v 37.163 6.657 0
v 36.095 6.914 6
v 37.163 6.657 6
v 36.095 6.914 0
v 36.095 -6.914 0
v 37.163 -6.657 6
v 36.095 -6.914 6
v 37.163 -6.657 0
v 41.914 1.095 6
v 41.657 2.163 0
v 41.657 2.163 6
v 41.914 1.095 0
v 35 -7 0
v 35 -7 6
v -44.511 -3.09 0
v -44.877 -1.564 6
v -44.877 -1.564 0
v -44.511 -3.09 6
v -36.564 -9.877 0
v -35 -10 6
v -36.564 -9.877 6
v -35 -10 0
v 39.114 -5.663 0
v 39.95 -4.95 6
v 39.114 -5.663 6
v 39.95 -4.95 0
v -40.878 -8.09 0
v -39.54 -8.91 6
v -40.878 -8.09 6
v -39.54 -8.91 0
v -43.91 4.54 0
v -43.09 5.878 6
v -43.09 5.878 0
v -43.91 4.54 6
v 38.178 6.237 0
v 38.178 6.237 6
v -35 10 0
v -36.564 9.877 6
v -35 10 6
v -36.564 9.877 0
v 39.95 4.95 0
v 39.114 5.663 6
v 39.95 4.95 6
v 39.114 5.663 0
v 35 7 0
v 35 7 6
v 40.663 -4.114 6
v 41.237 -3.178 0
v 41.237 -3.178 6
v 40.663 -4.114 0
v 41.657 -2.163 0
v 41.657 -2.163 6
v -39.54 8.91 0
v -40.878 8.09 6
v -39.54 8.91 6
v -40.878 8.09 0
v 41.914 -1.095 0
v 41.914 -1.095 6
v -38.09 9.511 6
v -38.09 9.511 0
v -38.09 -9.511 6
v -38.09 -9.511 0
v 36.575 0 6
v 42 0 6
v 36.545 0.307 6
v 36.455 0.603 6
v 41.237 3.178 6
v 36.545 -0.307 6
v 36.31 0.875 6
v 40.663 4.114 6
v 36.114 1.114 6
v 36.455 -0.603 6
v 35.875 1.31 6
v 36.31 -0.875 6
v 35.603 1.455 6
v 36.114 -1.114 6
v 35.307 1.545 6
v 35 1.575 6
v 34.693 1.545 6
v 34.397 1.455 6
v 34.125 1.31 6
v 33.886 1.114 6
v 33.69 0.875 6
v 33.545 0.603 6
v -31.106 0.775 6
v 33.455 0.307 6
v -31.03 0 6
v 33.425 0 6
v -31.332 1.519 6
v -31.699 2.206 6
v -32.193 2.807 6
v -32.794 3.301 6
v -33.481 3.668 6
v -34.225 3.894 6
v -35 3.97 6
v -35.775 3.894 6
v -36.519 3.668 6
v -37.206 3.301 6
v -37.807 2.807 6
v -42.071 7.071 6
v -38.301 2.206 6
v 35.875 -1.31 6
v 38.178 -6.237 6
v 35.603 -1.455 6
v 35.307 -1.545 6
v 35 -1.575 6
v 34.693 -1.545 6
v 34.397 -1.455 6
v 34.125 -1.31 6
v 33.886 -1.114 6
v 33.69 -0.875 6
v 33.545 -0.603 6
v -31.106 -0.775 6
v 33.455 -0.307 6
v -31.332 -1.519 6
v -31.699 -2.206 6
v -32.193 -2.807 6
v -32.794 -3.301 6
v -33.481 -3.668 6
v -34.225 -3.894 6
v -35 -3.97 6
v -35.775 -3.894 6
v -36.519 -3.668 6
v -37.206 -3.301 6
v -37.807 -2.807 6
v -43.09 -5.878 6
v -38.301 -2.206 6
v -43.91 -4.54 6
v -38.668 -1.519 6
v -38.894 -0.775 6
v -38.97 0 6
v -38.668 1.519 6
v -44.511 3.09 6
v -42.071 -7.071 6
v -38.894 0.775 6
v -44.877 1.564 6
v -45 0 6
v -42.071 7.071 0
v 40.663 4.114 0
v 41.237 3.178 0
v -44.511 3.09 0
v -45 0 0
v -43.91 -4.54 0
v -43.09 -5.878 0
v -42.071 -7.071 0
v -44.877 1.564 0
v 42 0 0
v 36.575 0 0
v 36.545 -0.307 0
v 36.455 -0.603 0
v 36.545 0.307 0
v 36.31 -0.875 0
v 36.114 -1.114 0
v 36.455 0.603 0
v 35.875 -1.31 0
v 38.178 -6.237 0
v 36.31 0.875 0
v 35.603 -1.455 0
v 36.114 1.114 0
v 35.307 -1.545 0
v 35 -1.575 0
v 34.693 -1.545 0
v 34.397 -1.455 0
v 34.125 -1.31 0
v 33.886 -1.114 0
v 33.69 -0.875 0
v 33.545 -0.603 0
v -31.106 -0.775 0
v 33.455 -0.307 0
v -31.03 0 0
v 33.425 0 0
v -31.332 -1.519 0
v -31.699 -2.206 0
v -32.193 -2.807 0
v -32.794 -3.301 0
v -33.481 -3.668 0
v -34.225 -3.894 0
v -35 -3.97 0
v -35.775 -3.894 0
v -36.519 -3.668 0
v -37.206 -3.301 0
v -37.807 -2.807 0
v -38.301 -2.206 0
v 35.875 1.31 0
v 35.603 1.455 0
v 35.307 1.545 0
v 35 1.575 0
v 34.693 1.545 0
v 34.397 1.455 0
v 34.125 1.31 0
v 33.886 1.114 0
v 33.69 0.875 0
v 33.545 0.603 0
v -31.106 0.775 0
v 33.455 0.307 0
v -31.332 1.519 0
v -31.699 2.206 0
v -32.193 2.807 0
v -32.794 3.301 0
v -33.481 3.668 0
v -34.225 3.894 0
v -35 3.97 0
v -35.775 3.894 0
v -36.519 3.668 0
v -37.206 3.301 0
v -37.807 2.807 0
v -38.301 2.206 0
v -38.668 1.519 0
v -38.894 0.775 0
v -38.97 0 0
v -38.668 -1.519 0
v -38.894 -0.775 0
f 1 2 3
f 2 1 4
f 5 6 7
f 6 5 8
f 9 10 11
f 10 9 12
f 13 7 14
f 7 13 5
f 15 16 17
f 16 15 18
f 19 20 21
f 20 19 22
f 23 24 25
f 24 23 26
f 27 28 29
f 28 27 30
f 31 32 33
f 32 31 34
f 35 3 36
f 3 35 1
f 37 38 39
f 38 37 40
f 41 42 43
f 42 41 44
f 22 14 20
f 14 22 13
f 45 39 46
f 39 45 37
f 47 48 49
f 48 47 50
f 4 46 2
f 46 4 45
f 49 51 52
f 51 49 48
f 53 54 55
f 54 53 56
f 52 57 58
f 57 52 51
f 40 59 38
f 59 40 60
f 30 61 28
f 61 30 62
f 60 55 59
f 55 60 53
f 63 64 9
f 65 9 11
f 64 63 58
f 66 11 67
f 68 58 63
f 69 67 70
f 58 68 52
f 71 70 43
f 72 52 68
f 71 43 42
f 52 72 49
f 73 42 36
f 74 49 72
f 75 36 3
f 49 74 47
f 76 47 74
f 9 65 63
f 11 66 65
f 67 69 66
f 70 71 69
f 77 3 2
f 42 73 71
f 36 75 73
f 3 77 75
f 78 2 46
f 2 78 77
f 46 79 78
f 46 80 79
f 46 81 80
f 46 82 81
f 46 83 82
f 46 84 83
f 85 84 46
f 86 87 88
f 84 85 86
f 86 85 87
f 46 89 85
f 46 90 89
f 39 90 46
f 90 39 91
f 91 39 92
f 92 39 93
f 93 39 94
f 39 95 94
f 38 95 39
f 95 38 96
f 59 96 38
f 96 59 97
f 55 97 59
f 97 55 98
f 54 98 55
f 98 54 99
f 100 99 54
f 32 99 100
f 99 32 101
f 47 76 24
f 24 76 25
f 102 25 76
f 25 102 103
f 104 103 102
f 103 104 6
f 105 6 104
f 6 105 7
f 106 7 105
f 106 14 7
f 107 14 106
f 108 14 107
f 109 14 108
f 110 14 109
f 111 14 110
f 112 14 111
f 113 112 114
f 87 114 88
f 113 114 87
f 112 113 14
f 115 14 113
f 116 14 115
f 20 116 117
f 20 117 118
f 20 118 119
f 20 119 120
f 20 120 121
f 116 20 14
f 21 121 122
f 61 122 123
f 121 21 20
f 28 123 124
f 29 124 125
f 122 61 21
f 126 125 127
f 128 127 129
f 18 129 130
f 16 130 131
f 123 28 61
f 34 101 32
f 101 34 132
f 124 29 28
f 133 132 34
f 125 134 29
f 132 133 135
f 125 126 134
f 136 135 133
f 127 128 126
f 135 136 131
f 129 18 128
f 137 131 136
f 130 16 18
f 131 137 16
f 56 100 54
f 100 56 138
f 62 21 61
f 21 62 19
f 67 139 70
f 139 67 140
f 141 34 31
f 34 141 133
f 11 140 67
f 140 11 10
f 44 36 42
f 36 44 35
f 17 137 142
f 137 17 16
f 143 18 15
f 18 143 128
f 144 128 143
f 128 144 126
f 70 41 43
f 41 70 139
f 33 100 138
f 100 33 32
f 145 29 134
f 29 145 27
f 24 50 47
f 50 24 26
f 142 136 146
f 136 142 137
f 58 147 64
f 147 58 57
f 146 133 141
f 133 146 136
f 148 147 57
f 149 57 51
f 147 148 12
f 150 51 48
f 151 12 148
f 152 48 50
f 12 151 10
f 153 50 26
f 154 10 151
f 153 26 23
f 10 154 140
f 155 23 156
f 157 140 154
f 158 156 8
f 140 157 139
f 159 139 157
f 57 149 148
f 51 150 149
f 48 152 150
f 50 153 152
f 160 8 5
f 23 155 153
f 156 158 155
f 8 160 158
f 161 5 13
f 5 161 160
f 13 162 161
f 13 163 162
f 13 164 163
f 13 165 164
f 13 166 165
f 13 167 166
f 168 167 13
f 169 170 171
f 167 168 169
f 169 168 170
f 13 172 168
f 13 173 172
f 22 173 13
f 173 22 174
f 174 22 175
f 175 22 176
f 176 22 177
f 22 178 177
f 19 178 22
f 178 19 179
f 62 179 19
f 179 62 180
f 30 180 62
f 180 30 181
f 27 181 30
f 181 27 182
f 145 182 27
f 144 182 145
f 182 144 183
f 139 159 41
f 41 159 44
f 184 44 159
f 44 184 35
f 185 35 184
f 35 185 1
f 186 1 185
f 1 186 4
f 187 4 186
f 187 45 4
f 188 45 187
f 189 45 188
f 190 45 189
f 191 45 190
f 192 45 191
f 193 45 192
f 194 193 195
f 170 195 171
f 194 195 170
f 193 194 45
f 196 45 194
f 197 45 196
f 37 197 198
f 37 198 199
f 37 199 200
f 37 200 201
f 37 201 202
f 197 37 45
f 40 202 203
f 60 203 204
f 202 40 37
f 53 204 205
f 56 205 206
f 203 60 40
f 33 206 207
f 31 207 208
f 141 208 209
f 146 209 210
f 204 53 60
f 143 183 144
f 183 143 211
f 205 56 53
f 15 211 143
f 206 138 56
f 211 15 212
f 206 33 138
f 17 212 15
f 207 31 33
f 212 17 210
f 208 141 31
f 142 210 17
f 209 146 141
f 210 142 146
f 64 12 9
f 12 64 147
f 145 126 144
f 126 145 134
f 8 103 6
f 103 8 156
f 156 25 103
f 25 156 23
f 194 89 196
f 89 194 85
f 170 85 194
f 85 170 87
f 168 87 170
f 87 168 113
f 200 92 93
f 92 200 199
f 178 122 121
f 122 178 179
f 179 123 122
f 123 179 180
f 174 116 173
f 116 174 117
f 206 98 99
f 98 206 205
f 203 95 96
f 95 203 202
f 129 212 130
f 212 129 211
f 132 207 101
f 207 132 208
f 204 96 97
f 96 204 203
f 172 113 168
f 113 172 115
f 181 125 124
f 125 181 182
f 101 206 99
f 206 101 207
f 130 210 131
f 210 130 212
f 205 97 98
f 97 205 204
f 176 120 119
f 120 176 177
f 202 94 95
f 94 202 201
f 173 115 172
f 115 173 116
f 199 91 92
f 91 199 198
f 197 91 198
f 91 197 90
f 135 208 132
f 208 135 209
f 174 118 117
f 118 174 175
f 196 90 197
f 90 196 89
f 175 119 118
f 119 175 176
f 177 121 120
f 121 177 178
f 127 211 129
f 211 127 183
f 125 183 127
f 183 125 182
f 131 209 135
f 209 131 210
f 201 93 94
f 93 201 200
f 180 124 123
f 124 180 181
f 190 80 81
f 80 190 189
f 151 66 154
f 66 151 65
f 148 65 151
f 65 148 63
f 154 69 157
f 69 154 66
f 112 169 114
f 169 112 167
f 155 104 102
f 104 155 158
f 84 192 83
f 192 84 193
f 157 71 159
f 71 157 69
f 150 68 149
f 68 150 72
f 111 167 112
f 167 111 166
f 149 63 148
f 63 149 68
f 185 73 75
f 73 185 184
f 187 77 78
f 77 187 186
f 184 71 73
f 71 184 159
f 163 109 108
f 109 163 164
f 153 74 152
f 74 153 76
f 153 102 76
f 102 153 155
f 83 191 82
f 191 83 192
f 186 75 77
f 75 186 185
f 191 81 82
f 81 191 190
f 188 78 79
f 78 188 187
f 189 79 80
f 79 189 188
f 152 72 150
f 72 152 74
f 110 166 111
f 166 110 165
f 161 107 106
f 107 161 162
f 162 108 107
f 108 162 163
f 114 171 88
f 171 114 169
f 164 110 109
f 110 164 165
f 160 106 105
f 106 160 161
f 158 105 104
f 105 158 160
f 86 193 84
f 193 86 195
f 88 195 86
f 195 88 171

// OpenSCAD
$fn = 32;

// ----------------------------------------------------------------------
// Lever: 70 mm between the bosses, 6 mm thick, smooth outline
// ----------------------------------------------------------------------

// --- parameters (mm) ---
lever_l = 70;             // distance between the boss centres
boss_a = 20;              // first boss diameter
boss_b = 14;              // second boss diameter
bore_a = 7.94;            // first bore
bore_b = 3.15;            // second bore
lever_t = 6;              // lever thickness

lever_profile = [[-45, 0], [-44.877, -1.564], [-44.511, -3.09], [-43.91, -4.54], [-43.09, -5.878], [-42.071, -7.071], [-40.878, -8.09], [-39.54, -8.91], [-38.09, -9.511], [-36.564, -9.877], [-35, -10], [35, -7], [36.095, -6.914], [37.163, -6.657], [38.178, -6.237], [39.114, -5.663], [39.95, -4.95], [40.663, -4.114], [41.237, -3.178], [41.657, -2.163], [41.914, -1.095], [42, 0], [41.914, 1.095], [41.657, 2.163], [41.237, 3.178], [40.663, 4.114], [39.95, 4.95], [39.114, 5.663], [38.178, 6.237], [37.163, 6.657], [36.095, 6.914], [35, 7], [-35, 10], [-36.564, 9.877], [-38.09, 9.511], [-39.54, 8.91], [-40.878, 8.09], [-42.071, 7.071], [-43.09, 5.878], [-43.91, 4.54], [-44.511, 3.09], [-44.877, 1.564]];

difference() {
  linear_extrude(height = lever_t) polygon(lever_profile);
  translate([-35, 0, -2.5]) cylinder(h = lever_t + 5, d = bore_a);
  translate([35, 0, -2.5]) cylinder(h = lever_t + 5, d = bore_b);
}
